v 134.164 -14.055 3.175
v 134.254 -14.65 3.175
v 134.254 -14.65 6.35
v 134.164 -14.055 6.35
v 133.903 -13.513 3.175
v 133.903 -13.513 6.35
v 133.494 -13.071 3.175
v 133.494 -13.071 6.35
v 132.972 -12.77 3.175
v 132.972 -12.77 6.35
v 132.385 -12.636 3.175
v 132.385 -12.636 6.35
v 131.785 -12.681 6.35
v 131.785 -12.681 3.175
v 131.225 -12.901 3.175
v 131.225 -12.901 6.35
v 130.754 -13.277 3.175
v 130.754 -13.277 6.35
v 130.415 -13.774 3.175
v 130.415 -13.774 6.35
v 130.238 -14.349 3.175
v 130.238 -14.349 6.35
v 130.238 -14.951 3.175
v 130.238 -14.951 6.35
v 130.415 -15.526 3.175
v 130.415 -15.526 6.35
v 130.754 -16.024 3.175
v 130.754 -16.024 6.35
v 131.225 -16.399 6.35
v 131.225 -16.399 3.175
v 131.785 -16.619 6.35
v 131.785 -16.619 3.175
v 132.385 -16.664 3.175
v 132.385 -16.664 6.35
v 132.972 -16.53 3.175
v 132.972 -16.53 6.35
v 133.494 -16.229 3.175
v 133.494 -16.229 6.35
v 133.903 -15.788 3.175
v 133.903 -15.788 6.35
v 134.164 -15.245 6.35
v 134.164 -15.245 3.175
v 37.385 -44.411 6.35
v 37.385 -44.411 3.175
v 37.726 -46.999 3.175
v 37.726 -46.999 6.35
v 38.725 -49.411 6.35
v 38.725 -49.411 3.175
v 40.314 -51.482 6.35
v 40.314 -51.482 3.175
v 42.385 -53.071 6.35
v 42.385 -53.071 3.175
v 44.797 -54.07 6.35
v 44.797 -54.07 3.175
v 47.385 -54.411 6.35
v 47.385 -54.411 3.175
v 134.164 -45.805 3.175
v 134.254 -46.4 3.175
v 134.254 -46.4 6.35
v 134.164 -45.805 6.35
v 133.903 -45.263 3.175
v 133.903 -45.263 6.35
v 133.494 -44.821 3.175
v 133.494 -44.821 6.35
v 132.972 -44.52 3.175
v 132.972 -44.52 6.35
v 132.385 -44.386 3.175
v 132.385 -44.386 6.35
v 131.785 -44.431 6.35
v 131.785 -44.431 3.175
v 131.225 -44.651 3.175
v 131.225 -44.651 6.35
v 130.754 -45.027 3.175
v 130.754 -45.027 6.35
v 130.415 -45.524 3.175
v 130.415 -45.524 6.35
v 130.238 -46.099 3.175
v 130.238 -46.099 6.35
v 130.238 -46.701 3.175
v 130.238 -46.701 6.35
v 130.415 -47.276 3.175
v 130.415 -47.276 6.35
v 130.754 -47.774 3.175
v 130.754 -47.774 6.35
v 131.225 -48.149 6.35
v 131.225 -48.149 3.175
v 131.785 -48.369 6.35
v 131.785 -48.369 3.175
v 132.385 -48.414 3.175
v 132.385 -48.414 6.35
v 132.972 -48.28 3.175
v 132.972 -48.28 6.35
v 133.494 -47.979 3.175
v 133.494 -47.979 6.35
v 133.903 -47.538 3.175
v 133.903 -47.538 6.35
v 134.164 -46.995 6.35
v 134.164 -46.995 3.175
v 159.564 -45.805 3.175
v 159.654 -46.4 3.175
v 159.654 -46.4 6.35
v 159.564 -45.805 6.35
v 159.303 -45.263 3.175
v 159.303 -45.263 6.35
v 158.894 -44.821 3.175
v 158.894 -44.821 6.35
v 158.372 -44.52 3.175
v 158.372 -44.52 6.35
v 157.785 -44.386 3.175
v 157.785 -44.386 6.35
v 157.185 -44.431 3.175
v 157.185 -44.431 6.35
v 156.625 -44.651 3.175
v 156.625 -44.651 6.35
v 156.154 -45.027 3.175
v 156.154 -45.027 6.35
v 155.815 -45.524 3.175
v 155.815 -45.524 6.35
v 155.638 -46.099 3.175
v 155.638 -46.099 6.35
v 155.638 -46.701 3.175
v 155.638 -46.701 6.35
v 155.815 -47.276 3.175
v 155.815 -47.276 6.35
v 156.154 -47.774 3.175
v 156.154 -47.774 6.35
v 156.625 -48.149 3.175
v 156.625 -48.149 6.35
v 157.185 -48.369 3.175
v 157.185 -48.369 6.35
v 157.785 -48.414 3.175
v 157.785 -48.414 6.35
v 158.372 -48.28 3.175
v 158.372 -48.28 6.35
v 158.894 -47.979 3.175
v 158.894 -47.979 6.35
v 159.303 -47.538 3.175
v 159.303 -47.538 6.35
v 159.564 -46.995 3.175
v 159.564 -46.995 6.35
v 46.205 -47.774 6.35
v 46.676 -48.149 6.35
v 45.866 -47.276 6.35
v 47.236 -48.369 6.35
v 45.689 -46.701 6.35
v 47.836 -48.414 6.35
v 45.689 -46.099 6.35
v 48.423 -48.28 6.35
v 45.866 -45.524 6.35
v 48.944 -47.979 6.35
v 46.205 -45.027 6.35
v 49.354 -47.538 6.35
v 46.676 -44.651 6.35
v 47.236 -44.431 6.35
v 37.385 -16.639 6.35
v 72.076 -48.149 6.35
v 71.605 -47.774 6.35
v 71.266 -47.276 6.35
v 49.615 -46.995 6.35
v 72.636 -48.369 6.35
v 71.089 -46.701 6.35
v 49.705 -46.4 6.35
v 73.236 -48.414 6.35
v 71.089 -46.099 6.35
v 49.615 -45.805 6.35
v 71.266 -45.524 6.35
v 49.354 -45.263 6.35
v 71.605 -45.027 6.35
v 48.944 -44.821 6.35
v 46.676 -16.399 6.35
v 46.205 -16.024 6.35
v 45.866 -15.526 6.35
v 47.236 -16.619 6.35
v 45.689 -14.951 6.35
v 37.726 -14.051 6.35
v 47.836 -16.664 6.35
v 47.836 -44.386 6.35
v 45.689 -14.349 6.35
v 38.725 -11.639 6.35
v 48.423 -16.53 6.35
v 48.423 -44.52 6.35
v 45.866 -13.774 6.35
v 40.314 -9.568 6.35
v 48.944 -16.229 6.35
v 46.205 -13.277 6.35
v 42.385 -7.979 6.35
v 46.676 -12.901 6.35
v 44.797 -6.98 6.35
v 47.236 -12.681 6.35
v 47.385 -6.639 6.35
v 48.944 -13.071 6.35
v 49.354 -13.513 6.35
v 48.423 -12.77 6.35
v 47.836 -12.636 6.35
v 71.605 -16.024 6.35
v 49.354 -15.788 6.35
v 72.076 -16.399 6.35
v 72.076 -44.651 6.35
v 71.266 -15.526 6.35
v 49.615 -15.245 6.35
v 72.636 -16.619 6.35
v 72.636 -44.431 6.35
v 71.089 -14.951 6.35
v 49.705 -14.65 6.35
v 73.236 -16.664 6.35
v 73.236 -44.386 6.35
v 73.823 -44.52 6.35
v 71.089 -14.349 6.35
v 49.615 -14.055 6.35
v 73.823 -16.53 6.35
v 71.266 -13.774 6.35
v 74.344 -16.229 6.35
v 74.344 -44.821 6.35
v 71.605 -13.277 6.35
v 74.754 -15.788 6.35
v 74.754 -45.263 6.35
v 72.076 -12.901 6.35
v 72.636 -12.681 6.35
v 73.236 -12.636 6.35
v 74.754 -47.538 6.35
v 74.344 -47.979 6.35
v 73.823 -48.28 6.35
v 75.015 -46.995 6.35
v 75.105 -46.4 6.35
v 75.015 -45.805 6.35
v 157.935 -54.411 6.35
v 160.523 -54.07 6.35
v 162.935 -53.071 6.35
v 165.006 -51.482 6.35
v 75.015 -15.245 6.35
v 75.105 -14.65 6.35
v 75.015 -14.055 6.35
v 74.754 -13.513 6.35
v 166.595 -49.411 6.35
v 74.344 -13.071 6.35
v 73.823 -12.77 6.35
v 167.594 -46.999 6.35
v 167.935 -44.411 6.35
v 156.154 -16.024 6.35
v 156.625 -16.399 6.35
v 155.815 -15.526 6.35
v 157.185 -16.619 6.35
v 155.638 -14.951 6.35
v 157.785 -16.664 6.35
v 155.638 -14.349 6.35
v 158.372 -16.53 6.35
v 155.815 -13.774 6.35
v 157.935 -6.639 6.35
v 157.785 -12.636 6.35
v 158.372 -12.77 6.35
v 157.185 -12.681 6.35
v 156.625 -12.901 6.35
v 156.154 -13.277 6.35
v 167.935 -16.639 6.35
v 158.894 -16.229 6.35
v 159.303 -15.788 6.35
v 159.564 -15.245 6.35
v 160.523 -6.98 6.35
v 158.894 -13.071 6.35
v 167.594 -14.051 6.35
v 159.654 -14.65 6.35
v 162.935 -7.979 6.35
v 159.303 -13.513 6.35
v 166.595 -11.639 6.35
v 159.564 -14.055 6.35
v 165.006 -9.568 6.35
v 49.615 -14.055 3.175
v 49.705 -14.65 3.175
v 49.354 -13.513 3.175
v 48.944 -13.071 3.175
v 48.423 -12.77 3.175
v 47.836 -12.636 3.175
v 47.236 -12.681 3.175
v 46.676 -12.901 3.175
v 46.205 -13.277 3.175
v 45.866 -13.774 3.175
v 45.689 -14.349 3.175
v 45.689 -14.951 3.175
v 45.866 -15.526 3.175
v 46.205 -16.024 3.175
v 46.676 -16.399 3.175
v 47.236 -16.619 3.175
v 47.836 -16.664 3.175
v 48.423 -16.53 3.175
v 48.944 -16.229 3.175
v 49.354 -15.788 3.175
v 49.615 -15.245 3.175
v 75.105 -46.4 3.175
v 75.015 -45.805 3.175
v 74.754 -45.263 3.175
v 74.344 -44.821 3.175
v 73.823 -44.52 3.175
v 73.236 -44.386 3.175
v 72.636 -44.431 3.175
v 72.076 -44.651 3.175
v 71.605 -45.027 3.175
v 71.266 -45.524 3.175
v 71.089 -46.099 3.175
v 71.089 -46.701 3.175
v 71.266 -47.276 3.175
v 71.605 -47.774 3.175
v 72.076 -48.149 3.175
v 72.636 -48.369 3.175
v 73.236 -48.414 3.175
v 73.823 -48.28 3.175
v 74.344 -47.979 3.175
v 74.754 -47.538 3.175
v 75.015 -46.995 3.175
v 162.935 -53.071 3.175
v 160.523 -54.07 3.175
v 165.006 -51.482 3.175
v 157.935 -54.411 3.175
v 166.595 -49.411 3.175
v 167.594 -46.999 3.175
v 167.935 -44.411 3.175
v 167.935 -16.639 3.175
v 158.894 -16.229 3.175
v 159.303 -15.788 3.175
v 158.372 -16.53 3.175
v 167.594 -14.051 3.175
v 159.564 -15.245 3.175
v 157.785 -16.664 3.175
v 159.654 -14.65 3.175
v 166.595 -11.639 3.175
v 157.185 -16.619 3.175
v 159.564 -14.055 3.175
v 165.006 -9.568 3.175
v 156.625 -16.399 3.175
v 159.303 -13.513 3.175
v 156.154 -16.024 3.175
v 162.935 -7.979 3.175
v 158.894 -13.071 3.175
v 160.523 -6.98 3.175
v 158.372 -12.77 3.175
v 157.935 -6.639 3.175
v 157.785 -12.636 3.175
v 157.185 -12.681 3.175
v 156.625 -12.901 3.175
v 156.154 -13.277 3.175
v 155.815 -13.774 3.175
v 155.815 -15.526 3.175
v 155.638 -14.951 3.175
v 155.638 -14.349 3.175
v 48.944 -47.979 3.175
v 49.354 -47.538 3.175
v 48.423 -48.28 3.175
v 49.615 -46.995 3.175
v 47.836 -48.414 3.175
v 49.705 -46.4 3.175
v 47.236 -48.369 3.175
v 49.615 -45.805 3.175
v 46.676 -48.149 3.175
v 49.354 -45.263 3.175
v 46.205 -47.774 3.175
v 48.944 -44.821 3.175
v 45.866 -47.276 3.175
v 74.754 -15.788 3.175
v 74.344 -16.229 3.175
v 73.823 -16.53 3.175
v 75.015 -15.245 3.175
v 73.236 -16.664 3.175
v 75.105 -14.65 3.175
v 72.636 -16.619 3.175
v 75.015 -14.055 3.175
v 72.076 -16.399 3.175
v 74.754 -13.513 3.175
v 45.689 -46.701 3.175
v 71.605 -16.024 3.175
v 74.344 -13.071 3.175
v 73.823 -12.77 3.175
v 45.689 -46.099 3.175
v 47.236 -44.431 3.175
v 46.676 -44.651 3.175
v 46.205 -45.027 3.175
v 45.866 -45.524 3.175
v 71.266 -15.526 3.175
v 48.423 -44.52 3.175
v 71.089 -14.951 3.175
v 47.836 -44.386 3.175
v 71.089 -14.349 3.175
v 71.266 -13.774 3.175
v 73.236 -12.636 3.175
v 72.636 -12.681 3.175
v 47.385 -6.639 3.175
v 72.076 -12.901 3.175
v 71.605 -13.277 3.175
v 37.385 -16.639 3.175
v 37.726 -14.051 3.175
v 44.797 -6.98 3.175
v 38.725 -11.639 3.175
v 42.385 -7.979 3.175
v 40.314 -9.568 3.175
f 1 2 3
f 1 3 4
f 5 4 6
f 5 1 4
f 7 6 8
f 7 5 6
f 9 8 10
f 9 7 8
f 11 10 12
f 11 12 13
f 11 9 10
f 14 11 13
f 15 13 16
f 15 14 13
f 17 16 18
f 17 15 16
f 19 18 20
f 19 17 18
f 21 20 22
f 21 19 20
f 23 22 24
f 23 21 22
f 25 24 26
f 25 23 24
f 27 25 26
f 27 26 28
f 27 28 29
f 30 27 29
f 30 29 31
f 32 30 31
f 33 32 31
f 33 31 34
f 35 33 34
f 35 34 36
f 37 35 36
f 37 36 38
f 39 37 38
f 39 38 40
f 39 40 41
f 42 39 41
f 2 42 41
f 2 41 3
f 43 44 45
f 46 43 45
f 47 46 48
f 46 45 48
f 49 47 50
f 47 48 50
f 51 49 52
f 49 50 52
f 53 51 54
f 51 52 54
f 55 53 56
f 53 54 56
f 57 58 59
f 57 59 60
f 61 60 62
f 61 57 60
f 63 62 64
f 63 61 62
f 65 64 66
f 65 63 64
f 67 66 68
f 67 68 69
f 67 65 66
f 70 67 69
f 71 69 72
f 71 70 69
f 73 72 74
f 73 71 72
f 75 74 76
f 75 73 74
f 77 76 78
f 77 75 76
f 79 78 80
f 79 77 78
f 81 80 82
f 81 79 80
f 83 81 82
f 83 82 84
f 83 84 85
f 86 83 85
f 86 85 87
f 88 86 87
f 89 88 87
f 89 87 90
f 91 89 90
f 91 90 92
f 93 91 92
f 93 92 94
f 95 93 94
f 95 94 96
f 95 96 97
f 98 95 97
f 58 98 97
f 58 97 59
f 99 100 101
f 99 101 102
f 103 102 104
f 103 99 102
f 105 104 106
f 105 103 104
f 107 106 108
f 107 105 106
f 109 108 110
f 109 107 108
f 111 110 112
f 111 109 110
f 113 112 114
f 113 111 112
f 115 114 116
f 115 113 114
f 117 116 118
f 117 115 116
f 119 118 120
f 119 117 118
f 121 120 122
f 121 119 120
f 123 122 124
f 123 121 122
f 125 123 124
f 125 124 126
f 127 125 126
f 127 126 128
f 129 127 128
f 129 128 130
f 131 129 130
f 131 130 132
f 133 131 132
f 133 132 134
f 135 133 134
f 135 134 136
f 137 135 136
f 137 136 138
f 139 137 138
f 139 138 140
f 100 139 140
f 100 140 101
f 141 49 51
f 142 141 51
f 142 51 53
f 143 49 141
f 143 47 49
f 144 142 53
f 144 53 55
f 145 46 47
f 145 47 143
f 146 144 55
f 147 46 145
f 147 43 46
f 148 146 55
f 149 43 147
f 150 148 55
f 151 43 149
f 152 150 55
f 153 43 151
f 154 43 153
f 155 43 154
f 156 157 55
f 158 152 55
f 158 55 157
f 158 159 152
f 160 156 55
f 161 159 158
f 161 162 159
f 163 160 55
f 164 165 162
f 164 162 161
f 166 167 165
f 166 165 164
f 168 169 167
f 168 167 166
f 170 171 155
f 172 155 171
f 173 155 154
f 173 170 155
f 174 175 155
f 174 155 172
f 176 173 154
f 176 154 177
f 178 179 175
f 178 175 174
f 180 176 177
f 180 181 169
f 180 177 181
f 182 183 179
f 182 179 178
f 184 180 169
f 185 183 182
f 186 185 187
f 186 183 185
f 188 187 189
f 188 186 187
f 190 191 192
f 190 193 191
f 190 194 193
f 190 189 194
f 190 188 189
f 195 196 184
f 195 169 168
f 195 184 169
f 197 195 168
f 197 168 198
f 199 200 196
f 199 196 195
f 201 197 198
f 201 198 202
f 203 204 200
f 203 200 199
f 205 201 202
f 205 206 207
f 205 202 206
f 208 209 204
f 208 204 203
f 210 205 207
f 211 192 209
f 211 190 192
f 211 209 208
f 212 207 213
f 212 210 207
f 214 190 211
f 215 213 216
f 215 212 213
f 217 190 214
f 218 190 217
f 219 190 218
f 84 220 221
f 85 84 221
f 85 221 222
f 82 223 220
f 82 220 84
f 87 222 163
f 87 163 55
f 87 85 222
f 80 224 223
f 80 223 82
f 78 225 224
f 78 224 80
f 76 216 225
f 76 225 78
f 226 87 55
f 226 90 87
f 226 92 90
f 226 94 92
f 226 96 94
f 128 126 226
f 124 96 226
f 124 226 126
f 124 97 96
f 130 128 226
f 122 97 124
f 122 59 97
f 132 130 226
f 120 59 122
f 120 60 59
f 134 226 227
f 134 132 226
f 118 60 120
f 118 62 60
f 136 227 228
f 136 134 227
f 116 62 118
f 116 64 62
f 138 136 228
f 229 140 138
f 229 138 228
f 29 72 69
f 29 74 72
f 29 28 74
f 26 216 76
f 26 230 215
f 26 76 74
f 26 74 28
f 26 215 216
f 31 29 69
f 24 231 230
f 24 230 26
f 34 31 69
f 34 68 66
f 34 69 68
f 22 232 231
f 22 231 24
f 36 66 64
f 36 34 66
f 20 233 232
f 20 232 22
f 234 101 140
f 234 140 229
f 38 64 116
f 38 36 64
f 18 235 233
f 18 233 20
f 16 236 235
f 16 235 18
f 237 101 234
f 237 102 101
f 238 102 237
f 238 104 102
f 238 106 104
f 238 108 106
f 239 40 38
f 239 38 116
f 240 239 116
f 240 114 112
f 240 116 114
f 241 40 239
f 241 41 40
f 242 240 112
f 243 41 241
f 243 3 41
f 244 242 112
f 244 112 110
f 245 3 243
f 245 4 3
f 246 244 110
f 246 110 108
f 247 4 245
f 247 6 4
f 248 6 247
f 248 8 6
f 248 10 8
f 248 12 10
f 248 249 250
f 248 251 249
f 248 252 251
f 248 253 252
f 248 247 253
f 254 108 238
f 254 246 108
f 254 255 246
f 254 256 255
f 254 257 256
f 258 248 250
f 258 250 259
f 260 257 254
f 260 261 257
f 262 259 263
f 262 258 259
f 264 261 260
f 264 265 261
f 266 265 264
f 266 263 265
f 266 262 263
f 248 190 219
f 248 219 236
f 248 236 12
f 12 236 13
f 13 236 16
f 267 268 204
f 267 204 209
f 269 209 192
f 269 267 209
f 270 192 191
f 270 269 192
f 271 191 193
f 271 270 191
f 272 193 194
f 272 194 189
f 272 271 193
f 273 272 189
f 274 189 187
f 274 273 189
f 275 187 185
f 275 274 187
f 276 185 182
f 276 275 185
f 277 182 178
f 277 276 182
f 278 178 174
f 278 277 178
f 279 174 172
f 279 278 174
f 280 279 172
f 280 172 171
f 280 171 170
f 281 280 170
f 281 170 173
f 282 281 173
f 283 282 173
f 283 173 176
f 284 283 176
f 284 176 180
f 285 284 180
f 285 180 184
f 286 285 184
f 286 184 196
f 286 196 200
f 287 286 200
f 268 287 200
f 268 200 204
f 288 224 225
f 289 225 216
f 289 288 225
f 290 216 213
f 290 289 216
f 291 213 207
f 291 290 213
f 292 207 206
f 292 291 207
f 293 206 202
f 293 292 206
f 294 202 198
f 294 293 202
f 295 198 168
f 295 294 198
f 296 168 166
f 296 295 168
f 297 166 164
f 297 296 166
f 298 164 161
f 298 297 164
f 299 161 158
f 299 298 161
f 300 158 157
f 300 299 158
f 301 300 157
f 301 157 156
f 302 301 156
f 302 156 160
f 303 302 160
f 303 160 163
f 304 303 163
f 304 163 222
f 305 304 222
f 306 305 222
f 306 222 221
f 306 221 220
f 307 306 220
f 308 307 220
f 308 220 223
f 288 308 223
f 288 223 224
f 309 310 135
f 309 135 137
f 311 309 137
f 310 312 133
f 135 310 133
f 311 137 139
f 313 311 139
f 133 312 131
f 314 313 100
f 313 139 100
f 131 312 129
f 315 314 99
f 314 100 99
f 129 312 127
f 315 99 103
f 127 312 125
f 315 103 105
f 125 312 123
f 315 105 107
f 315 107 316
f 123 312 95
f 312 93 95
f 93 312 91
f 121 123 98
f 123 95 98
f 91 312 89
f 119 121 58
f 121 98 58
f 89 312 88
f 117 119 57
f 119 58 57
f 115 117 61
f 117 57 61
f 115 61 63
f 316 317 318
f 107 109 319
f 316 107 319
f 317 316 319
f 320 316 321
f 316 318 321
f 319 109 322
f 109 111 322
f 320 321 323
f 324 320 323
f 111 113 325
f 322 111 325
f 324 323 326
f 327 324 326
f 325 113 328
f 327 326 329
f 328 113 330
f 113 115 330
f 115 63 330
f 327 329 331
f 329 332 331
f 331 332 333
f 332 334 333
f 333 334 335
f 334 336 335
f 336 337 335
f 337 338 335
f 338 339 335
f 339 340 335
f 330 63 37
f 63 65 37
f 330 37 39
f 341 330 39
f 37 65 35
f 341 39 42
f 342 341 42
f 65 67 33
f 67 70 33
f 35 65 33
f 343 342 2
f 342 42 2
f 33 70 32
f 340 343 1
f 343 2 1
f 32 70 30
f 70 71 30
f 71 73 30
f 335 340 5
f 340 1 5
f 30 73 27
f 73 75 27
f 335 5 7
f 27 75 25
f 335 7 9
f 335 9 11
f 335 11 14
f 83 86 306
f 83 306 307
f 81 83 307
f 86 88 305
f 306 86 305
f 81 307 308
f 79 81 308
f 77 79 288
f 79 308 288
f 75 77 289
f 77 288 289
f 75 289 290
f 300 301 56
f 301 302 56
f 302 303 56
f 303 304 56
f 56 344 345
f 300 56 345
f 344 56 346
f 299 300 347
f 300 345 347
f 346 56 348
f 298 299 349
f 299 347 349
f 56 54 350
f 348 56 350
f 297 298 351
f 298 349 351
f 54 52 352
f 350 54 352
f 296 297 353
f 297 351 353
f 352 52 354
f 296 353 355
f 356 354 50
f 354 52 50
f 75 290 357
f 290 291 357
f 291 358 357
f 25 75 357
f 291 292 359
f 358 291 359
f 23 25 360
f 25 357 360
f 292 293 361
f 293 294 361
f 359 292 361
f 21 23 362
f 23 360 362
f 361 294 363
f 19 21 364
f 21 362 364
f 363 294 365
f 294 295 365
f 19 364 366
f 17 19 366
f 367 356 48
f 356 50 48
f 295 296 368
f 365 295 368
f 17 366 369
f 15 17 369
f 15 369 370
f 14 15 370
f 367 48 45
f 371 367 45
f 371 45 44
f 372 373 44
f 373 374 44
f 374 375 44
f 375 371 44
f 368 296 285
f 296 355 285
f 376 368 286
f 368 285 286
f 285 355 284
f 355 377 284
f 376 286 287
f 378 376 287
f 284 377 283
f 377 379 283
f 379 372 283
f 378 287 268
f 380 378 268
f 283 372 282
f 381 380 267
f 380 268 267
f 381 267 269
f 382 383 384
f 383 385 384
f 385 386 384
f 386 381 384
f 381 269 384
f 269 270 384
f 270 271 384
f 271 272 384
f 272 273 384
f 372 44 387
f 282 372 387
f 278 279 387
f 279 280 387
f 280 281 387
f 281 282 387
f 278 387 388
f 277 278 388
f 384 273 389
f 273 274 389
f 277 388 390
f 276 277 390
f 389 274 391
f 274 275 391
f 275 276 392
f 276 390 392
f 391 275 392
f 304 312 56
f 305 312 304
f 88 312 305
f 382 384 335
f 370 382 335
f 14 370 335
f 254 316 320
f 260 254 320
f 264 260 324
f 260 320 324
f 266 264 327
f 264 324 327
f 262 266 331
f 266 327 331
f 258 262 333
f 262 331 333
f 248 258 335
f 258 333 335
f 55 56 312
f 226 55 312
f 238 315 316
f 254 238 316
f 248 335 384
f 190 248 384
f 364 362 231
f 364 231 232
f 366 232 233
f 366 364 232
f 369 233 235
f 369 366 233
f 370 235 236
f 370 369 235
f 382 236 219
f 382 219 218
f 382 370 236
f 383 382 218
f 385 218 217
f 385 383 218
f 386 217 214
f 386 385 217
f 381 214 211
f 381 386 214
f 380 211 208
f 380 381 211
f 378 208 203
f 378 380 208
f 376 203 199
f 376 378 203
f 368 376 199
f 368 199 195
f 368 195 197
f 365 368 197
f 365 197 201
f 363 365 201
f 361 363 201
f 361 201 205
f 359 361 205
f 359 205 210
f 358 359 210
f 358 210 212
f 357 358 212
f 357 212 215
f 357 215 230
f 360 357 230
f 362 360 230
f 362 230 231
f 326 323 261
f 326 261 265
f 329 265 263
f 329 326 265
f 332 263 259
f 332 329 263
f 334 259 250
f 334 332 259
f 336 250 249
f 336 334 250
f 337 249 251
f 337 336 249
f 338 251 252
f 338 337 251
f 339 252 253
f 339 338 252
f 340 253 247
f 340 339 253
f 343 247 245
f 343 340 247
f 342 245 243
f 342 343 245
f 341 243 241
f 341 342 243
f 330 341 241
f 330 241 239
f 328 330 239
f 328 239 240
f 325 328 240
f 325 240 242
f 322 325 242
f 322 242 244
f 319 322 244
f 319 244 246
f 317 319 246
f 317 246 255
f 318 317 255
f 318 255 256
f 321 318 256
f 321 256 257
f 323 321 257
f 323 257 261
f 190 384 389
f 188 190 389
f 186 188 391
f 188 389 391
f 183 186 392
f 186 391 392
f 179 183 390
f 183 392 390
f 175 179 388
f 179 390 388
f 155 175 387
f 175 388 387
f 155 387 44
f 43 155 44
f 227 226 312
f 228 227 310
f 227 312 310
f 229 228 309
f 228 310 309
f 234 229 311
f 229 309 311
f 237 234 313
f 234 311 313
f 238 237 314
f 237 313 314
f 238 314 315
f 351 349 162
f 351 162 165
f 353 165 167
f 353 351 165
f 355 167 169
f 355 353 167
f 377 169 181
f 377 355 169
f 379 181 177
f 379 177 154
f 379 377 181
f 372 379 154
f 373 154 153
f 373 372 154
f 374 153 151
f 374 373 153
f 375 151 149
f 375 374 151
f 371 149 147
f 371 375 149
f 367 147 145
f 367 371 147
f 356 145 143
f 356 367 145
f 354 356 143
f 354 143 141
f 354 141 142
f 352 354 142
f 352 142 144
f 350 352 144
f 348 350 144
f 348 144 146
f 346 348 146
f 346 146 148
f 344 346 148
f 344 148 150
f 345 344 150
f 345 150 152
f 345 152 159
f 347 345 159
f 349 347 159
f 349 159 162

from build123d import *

# Parameters (mm, degrees)
BOSS_EXTRUDE1_DEPTH = 3.175
CUT_EXTRUDE1_DEPTH  = 10
SKETCH3_R           = 2.0193
BOSS_EXTRUDE2_DEPTH = 3.175
FILLET1_R           = 10
FILLET2_R           = 50
SKETCH4_R           = 2.02
CUT_EXTRUDE2_DEPTH  = 10
SKETCH5_R           = 2.0193
BOSS_EXTRUDE3_DEPTH = 3.175
SKETCH6_W           = 3.175
SKETCH6_H           = 346.1216
CUT_EXTRUDE3_DEPTH  = 131.549169731


with BuildPart() as part:
    # Sketch1 → Boss-Extrude1 (new body)
    with BuildSketch(Plane.XY):
        Polygon((165.934536959, -16.66935), (157.315236959, -8.05005), (115.359952094, -8.05005), (89.959952094, -8.05005), (48.004667228, -8.05005), (39.385367228, -16.66935), (39.385367228, -40.05005), (39.385367228, -52.41105), (165.934536959, -56.67505), (165.934536959, -42.05005), align=None)
        with BuildLine():
            ThreePointArc((47.685367228, -44.38075), (49.704667228, -46.40005), (47.685367228, -48.41935))
            ThreePointArc((47.685367228, -48.41935), (45.666067228, -46.40005), (47.685367228, -44.38075))
        make_face(mode=Mode.SUBTRACT)
        with BuildLine():
            ThreePointArc((47.685367228, -12.63075), (49.704667228, -14.65005), (47.685367228, -16.66935))
            ThreePointArc((47.685367228, -16.66935), (45.666067228, -14.65005), (47.685367228, -12.63075))
        make_face(mode=Mode.SUBTRACT)
        with BuildLine():
            ThreePointArc((73.085367228, -44.38075), (75.104667228, -46.40005), (73.085367228, -48.41935))
            ThreePointArc((73.085367228, -48.41935), (71.066067228, -46.40005), (73.085367228, -44.38075))
        make_face(mode=Mode.SUBTRACT)
        with BuildLine():
            ThreePointArc((73.085367228, -12.63075), (75.104667228, -14.65005), (73.085367228, -16.66935))
            ThreePointArc((73.085367228, -16.66935), (71.066067228, -14.65005), (73.085367228, -12.63075))
        make_face(mode=Mode.SUBTRACT)
        with BuildLine():
            ThreePointArc((132.234536959, -44.38075), (134.253836959, -46.40005), (132.234536959, -48.41935))
            ThreePointArc((132.234536959, -48.41935), (130.215236959, -46.40005), (132.234536959, -44.38075))
        make_face(mode=Mode.SUBTRACT)
        with BuildLine():
            ThreePointArc((132.234536959, -12.63075), (134.253836959, -14.65005), (132.234536959, -16.66935))
            ThreePointArc((132.234536959, -16.66935), (130.215236959, -14.65005), (132.234536959, -12.63075))
        make_face(mode=Mode.SUBTRACT)
        with BuildLine():
            ThreePointArc((157.634536959, -44.38075), (159.653836959, -46.40005), (157.634536959, -48.41935))
            ThreePointArc((157.634536959, -48.41935), (155.615236959, -46.40005), (157.634536959, -44.38075))
        make_face(mode=Mode.SUBTRACT)
        with BuildLine():
            ThreePointArc((157.634536959, -12.63075), (159.653836959, -14.65005), (157.634536959, -16.66935))
            ThreePointArc((157.634536959, -16.66935), (155.615236959, -14.65005), (157.634536959, -12.63075))
        make_face(mode=Mode.SUBTRACT)
        Polygon((115.359952094, -8.05005), (157.315236959, -8.05005), (115.359952094, 33.905234866), align=None)
        Polygon((89.959952094, -8.05005), (115.359952094, -8.05005), (115.359952094, 33.905234866), (115.359952094, 203.394265134), (115.359952094, 245.34955), (89.959952094, 245.34955), (89.959952094, 203.394265134), (89.959952094, 33.905234866), align=None)
        Polygon((48.004667228, -8.05005), (89.959952094, -8.05005), (89.959952094, 33.905234866), align=None)
        Polygon((89.959952094, 245.34955), (115.359952094, 245.34955), (157.315236959, 245.34955), (165.934536959, 253.96885), (165.934536959, 279.34955), (165.934536959, 293.97455), (39.385367228, 289.71055), (39.385367228, 277.34955), (39.385367228, 253.96885), (48.004667228, 245.34955), align=None)
        with BuildLine():
            ThreePointArc((47.685367228, 253.96885), (49.704667228, 251.94955), (47.685367228, 249.93025))
            ThreePointArc((47.685367228, 249.93025), (45.666067228, 251.94955), (47.685367228, 253.96885))
        make_face(mode=Mode.SUBTRACT)
        with BuildLine():
            ThreePointArc((47.685367228, 285.71885), (49.704667228, 283.69955), (47.685367228, 281.68025))
            ThreePointArc((47.685367228, 281.68025), (45.666067228, 283.69955), (47.685367228, 285.71885))
        make_face(mode=Mode.SUBTRACT)
        with BuildLine():
            ThreePointArc((73.085367228, 253.96885), (75.104667228, 251.94955), (73.085367228, 249.93025))
            ThreePointArc((73.085367228, 249.93025), (71.066067228, 251.94955), (73.085367228, 253.96885))
        make_face(mode=Mode.SUBTRACT)
        with BuildLine():
            ThreePointArc((73.085367228, 285.71885), (75.104667228, 283.69955), (73.085367228, 281.68025))
            ThreePointArc((73.085367228, 281.68025), (71.066067228, 283.69955), (73.085367228, 285.71885))
        make_face(mode=Mode.SUBTRACT)
        with BuildLine():
            ThreePointArc((132.234536959, 253.96885), (134.253836959, 251.94955), (132.234536959, 249.93025))
            ThreePointArc((132.234536959, 249.93025), (130.215236959, 251.94955), (132.234536959, 253.96885))
        make_face(mode=Mode.SUBTRACT)
        with BuildLine():
            ThreePointArc((157.634536959, 253.96885), (159.653836959, 251.94955), (157.634536959, 249.93025))
            ThreePointArc((157.634536959, 249.93025), (155.615236959, 251.94955), (157.634536959, 253.96885))
        make_face(mode=Mode.SUBTRACT)
        with BuildLine():
            ThreePointArc((157.634536959, 285.71885), (159.653836959, 283.69955), (157.634536959, 281.68025))
            ThreePointArc((157.634536959, 281.68025), (155.615236959, 283.69955), (157.634536959, 285.71885))
        make_face(mode=Mode.SUBTRACT)
        Polygon((115.359952094, 245.34955), (115.359952094, 203.394265134), (157.315236959, 245.34955), align=None)
        Polygon((48.004667228, 245.34955), (89.959952094, 203.394265134), (89.959952094, 245.34955), align=None)
    extrude(amount=BOSS_EXTRUDE1_DEPTH)

    # Sketch2 → Cut-Extrude1 (cut)
    with BuildSketch(Plane.XY.offset(3.175)):
        Polygon((84.385367228, -52.41105), (39.385367228, -52.41105), (165.934536959, -56.67505), (165.934536959, -52.41105), (120.934536959, -52.41105), align=None)
        Polygon((120.934536959, 289.71055), (165.934536959, 289.71055), (165.934536959, 293.97455), (39.385367228, 289.71055), (84.385367228, 289.71055), align=None)
    extrude(amount=-CUT_EXTRUDE1_DEPTH, mode=Mode.SUBTRACT)

    # Sketch3 → Boss-Extrude2 (add)
    with BuildSketch(Plane.XY.offset(3.175)):
        Polygon((37.385367228, -15.840922875), (37.385367228, -54.41105), (167.934536959, -54.41105), (167.934536959, -15.840922875), (117.359952094, 34.73366199), (117.359952094, 202.56583801), (167.934536959, 253.140422875), (167.934536959, 291.71055), (37.385367228, 291.71055), (37.385367228, 253.140422875), (87.959952094, 202.56583801), (87.959952094, 34.73366199), align=None)
        with Locations((132.234536959, -46.40005)):
            Circle(SKETCH3_R, mode=Mode.SUBTRACT)
        with Locations((132.234536959, -14.65005)):
            Circle(SKETCH3_R, mode=Mode.SUBTRACT)
        with Locations((47.685367228, -14.65005)):
            Circle(SKETCH3_R, mode=Mode.SUBTRACT)
        with Locations((47.685367228, -46.40005)):
            Circle(SKETCH3_R, mode=Mode.SUBTRACT)
        with Locations((73.085367228, -46.40005)):
            Circle(SKETCH3_R, mode=Mode.SUBTRACT)
        with Locations((73.085367228, -14.65005)):
            Circle(SKETCH3_R, mode=Mode.SUBTRACT)
        with Locations((157.634536959, -14.65005)):
            Circle(SKETCH3_R, mode=Mode.SUBTRACT)
        with Locations((157.634536959, -46.40005)):
            Circle(SKETCH3_R, mode=Mode.SUBTRACT)
        with Locations((132.234536959, 251.94955)):
            Circle(SKETCH3_R, mode=Mode.SUBTRACT)
        with Locations((73.085367228, 251.94955)):
            Circle(SKETCH3_R, mode=Mode.SUBTRACT)
        with Locations((157.634536959, 251.94955)):
            Circle(SKETCH3_R, mode=Mode.SUBTRACT)
        with Locations((47.685367228, 251.94955)):
            Circle(SKETCH3_R, mode=Mode.SUBTRACT)
        with Locations((47.685367228, 283.69955)):
            Circle(SKETCH3_R, mode=Mode.SUBTRACT)
        with Locations((73.085367228, 283.69955)):
            Circle(SKETCH3_R, mode=Mode.SUBTRACT)
        with Locations((157.634536959, 283.69955)):
            Circle(SKETCH3_R, mode=Mode.SUBTRACT)
    extrude(amount=-BOSS_EXTRUDE2_DEPTH)

    # Fillet1
    fillet1_edges = [part.edges().sort_by_distance(p)[0] for p in [
        (37.385367228, -54.41105, 1.5875),
        (167.934536959, -54.41105, 1.5875),
        (167.934536959, -15.840922875, 1.5875),
        (167.934536959, 253.140422875, 1.5875),
        (167.934536959, 291.71055, 1.5875),
        (37.385367228, 291.71055, 1.5875),
        (37.385367228, 253.140422875, 1.5875),
        (37.385367228, -15.840922875, 1.5875),
    ]]
    fillet(fillet1_edges, radius=FILLET1_R)

    # Fillet2
    fillet2_edges = [part.edges().sort_by_distance(p)[0] for p in [
        (117.359952094, 34.73366199, 1.5875),
        (117.359952094, 202.56583801, 1.5875),
        (87.959952094, 202.56583801, 1.5875),
        (87.959952094, 34.73366199, 1.5875),
    ]]
    fillet(fillet2_edges, radius=FILLET2_R)

    # Sketch4 → Cut-Extrude2 (cut)
    with BuildSketch(Plane.XY.offset(3.175)):
        with Locations((132.234536959, 283.69955)):
            Circle(SKETCH4_R)
    extrude(amount=-CUT_EXTRUDE2_DEPTH, mode=Mode.SUBTRACT)

    # Sketch5 → Boss-Extrude3 (add)
    with BuildSketch(Plane.XY.offset(3.175)):
        with BuildLine():
            Line((167.934536959, -44.41105), (167.934536959, -16.63905))
            ThreePointArc((167.934536959, -16.63905), (165.005604771, -9.567982188), (157.934536959, -6.63905))
            Line((157.934536959, -6.63905), (47.385367228, -6.63905))
            ThreePointArc((47.385367228, -6.63905), (40.314299416, -9.567982188), (37.385367228, -16.63905))
            Line((37.385367228, -16.63905), (37.385367228, -44.41105))
            ThreePointArc((37.385367228, -44.41105), (40.314299416, -51.482117812), (47.385367228, -54.41105))
            Line((47.385367228, -54.41105), (157.934536959, -54.41105))
            ThreePointArc((157.934536959, -54.41105), (165.005604771, -51.482117812), (167.934536959, -44.41105))
        make_face()
        with Locations((47.685367228, -46.40005)):
            Circle(SKETCH5_R, mode=Mode.SUBTRACT)
        with Locations((73.085367228, -46.40005)):
            Circle(SKETCH5_R, mode=Mode.SUBTRACT)
        with Locations((132.234536959, -46.40005)):
            Circle(SKETCH5_R, mode=Mode.SUBTRACT)
        with Locations((157.634536959, -46.40005)):
            Circle(SKETCH5_R, mode=Mode.SUBTRACT)
        with Locations((47.685367228, -14.65005)):
            Circle(SKETCH5_R, mode=Mode.SUBTRACT)
        with Locations((73.085367228, -14.65005)):
            Circle(SKETCH5_R, mode=Mode.SUBTRACT)
        with Locations((132.234536959, -14.65005)):
            Circle(SKETCH5_R, mode=Mode.SUBTRACT)
        with Locations((157.634536959, -14.65005)):
            Circle(SKETCH5_R, mode=Mode.SUBTRACT)
    extrude(amount=BOSS_EXTRUDE3_DEPTH)

    # Sketch6 → Cut-Extrude3 (cut, through all)
    with BuildSketch(Plane.ZY.offset(-37.385367228)):
        with Locations((1.5875, 118.64975)):
            Rectangle(SKETCH6_W, SKETCH6_H)
    extrude(amount=-CUT_EXTRUDE3_DEPTH, mode=Mode.SUBTRACT)


solid = part.part
